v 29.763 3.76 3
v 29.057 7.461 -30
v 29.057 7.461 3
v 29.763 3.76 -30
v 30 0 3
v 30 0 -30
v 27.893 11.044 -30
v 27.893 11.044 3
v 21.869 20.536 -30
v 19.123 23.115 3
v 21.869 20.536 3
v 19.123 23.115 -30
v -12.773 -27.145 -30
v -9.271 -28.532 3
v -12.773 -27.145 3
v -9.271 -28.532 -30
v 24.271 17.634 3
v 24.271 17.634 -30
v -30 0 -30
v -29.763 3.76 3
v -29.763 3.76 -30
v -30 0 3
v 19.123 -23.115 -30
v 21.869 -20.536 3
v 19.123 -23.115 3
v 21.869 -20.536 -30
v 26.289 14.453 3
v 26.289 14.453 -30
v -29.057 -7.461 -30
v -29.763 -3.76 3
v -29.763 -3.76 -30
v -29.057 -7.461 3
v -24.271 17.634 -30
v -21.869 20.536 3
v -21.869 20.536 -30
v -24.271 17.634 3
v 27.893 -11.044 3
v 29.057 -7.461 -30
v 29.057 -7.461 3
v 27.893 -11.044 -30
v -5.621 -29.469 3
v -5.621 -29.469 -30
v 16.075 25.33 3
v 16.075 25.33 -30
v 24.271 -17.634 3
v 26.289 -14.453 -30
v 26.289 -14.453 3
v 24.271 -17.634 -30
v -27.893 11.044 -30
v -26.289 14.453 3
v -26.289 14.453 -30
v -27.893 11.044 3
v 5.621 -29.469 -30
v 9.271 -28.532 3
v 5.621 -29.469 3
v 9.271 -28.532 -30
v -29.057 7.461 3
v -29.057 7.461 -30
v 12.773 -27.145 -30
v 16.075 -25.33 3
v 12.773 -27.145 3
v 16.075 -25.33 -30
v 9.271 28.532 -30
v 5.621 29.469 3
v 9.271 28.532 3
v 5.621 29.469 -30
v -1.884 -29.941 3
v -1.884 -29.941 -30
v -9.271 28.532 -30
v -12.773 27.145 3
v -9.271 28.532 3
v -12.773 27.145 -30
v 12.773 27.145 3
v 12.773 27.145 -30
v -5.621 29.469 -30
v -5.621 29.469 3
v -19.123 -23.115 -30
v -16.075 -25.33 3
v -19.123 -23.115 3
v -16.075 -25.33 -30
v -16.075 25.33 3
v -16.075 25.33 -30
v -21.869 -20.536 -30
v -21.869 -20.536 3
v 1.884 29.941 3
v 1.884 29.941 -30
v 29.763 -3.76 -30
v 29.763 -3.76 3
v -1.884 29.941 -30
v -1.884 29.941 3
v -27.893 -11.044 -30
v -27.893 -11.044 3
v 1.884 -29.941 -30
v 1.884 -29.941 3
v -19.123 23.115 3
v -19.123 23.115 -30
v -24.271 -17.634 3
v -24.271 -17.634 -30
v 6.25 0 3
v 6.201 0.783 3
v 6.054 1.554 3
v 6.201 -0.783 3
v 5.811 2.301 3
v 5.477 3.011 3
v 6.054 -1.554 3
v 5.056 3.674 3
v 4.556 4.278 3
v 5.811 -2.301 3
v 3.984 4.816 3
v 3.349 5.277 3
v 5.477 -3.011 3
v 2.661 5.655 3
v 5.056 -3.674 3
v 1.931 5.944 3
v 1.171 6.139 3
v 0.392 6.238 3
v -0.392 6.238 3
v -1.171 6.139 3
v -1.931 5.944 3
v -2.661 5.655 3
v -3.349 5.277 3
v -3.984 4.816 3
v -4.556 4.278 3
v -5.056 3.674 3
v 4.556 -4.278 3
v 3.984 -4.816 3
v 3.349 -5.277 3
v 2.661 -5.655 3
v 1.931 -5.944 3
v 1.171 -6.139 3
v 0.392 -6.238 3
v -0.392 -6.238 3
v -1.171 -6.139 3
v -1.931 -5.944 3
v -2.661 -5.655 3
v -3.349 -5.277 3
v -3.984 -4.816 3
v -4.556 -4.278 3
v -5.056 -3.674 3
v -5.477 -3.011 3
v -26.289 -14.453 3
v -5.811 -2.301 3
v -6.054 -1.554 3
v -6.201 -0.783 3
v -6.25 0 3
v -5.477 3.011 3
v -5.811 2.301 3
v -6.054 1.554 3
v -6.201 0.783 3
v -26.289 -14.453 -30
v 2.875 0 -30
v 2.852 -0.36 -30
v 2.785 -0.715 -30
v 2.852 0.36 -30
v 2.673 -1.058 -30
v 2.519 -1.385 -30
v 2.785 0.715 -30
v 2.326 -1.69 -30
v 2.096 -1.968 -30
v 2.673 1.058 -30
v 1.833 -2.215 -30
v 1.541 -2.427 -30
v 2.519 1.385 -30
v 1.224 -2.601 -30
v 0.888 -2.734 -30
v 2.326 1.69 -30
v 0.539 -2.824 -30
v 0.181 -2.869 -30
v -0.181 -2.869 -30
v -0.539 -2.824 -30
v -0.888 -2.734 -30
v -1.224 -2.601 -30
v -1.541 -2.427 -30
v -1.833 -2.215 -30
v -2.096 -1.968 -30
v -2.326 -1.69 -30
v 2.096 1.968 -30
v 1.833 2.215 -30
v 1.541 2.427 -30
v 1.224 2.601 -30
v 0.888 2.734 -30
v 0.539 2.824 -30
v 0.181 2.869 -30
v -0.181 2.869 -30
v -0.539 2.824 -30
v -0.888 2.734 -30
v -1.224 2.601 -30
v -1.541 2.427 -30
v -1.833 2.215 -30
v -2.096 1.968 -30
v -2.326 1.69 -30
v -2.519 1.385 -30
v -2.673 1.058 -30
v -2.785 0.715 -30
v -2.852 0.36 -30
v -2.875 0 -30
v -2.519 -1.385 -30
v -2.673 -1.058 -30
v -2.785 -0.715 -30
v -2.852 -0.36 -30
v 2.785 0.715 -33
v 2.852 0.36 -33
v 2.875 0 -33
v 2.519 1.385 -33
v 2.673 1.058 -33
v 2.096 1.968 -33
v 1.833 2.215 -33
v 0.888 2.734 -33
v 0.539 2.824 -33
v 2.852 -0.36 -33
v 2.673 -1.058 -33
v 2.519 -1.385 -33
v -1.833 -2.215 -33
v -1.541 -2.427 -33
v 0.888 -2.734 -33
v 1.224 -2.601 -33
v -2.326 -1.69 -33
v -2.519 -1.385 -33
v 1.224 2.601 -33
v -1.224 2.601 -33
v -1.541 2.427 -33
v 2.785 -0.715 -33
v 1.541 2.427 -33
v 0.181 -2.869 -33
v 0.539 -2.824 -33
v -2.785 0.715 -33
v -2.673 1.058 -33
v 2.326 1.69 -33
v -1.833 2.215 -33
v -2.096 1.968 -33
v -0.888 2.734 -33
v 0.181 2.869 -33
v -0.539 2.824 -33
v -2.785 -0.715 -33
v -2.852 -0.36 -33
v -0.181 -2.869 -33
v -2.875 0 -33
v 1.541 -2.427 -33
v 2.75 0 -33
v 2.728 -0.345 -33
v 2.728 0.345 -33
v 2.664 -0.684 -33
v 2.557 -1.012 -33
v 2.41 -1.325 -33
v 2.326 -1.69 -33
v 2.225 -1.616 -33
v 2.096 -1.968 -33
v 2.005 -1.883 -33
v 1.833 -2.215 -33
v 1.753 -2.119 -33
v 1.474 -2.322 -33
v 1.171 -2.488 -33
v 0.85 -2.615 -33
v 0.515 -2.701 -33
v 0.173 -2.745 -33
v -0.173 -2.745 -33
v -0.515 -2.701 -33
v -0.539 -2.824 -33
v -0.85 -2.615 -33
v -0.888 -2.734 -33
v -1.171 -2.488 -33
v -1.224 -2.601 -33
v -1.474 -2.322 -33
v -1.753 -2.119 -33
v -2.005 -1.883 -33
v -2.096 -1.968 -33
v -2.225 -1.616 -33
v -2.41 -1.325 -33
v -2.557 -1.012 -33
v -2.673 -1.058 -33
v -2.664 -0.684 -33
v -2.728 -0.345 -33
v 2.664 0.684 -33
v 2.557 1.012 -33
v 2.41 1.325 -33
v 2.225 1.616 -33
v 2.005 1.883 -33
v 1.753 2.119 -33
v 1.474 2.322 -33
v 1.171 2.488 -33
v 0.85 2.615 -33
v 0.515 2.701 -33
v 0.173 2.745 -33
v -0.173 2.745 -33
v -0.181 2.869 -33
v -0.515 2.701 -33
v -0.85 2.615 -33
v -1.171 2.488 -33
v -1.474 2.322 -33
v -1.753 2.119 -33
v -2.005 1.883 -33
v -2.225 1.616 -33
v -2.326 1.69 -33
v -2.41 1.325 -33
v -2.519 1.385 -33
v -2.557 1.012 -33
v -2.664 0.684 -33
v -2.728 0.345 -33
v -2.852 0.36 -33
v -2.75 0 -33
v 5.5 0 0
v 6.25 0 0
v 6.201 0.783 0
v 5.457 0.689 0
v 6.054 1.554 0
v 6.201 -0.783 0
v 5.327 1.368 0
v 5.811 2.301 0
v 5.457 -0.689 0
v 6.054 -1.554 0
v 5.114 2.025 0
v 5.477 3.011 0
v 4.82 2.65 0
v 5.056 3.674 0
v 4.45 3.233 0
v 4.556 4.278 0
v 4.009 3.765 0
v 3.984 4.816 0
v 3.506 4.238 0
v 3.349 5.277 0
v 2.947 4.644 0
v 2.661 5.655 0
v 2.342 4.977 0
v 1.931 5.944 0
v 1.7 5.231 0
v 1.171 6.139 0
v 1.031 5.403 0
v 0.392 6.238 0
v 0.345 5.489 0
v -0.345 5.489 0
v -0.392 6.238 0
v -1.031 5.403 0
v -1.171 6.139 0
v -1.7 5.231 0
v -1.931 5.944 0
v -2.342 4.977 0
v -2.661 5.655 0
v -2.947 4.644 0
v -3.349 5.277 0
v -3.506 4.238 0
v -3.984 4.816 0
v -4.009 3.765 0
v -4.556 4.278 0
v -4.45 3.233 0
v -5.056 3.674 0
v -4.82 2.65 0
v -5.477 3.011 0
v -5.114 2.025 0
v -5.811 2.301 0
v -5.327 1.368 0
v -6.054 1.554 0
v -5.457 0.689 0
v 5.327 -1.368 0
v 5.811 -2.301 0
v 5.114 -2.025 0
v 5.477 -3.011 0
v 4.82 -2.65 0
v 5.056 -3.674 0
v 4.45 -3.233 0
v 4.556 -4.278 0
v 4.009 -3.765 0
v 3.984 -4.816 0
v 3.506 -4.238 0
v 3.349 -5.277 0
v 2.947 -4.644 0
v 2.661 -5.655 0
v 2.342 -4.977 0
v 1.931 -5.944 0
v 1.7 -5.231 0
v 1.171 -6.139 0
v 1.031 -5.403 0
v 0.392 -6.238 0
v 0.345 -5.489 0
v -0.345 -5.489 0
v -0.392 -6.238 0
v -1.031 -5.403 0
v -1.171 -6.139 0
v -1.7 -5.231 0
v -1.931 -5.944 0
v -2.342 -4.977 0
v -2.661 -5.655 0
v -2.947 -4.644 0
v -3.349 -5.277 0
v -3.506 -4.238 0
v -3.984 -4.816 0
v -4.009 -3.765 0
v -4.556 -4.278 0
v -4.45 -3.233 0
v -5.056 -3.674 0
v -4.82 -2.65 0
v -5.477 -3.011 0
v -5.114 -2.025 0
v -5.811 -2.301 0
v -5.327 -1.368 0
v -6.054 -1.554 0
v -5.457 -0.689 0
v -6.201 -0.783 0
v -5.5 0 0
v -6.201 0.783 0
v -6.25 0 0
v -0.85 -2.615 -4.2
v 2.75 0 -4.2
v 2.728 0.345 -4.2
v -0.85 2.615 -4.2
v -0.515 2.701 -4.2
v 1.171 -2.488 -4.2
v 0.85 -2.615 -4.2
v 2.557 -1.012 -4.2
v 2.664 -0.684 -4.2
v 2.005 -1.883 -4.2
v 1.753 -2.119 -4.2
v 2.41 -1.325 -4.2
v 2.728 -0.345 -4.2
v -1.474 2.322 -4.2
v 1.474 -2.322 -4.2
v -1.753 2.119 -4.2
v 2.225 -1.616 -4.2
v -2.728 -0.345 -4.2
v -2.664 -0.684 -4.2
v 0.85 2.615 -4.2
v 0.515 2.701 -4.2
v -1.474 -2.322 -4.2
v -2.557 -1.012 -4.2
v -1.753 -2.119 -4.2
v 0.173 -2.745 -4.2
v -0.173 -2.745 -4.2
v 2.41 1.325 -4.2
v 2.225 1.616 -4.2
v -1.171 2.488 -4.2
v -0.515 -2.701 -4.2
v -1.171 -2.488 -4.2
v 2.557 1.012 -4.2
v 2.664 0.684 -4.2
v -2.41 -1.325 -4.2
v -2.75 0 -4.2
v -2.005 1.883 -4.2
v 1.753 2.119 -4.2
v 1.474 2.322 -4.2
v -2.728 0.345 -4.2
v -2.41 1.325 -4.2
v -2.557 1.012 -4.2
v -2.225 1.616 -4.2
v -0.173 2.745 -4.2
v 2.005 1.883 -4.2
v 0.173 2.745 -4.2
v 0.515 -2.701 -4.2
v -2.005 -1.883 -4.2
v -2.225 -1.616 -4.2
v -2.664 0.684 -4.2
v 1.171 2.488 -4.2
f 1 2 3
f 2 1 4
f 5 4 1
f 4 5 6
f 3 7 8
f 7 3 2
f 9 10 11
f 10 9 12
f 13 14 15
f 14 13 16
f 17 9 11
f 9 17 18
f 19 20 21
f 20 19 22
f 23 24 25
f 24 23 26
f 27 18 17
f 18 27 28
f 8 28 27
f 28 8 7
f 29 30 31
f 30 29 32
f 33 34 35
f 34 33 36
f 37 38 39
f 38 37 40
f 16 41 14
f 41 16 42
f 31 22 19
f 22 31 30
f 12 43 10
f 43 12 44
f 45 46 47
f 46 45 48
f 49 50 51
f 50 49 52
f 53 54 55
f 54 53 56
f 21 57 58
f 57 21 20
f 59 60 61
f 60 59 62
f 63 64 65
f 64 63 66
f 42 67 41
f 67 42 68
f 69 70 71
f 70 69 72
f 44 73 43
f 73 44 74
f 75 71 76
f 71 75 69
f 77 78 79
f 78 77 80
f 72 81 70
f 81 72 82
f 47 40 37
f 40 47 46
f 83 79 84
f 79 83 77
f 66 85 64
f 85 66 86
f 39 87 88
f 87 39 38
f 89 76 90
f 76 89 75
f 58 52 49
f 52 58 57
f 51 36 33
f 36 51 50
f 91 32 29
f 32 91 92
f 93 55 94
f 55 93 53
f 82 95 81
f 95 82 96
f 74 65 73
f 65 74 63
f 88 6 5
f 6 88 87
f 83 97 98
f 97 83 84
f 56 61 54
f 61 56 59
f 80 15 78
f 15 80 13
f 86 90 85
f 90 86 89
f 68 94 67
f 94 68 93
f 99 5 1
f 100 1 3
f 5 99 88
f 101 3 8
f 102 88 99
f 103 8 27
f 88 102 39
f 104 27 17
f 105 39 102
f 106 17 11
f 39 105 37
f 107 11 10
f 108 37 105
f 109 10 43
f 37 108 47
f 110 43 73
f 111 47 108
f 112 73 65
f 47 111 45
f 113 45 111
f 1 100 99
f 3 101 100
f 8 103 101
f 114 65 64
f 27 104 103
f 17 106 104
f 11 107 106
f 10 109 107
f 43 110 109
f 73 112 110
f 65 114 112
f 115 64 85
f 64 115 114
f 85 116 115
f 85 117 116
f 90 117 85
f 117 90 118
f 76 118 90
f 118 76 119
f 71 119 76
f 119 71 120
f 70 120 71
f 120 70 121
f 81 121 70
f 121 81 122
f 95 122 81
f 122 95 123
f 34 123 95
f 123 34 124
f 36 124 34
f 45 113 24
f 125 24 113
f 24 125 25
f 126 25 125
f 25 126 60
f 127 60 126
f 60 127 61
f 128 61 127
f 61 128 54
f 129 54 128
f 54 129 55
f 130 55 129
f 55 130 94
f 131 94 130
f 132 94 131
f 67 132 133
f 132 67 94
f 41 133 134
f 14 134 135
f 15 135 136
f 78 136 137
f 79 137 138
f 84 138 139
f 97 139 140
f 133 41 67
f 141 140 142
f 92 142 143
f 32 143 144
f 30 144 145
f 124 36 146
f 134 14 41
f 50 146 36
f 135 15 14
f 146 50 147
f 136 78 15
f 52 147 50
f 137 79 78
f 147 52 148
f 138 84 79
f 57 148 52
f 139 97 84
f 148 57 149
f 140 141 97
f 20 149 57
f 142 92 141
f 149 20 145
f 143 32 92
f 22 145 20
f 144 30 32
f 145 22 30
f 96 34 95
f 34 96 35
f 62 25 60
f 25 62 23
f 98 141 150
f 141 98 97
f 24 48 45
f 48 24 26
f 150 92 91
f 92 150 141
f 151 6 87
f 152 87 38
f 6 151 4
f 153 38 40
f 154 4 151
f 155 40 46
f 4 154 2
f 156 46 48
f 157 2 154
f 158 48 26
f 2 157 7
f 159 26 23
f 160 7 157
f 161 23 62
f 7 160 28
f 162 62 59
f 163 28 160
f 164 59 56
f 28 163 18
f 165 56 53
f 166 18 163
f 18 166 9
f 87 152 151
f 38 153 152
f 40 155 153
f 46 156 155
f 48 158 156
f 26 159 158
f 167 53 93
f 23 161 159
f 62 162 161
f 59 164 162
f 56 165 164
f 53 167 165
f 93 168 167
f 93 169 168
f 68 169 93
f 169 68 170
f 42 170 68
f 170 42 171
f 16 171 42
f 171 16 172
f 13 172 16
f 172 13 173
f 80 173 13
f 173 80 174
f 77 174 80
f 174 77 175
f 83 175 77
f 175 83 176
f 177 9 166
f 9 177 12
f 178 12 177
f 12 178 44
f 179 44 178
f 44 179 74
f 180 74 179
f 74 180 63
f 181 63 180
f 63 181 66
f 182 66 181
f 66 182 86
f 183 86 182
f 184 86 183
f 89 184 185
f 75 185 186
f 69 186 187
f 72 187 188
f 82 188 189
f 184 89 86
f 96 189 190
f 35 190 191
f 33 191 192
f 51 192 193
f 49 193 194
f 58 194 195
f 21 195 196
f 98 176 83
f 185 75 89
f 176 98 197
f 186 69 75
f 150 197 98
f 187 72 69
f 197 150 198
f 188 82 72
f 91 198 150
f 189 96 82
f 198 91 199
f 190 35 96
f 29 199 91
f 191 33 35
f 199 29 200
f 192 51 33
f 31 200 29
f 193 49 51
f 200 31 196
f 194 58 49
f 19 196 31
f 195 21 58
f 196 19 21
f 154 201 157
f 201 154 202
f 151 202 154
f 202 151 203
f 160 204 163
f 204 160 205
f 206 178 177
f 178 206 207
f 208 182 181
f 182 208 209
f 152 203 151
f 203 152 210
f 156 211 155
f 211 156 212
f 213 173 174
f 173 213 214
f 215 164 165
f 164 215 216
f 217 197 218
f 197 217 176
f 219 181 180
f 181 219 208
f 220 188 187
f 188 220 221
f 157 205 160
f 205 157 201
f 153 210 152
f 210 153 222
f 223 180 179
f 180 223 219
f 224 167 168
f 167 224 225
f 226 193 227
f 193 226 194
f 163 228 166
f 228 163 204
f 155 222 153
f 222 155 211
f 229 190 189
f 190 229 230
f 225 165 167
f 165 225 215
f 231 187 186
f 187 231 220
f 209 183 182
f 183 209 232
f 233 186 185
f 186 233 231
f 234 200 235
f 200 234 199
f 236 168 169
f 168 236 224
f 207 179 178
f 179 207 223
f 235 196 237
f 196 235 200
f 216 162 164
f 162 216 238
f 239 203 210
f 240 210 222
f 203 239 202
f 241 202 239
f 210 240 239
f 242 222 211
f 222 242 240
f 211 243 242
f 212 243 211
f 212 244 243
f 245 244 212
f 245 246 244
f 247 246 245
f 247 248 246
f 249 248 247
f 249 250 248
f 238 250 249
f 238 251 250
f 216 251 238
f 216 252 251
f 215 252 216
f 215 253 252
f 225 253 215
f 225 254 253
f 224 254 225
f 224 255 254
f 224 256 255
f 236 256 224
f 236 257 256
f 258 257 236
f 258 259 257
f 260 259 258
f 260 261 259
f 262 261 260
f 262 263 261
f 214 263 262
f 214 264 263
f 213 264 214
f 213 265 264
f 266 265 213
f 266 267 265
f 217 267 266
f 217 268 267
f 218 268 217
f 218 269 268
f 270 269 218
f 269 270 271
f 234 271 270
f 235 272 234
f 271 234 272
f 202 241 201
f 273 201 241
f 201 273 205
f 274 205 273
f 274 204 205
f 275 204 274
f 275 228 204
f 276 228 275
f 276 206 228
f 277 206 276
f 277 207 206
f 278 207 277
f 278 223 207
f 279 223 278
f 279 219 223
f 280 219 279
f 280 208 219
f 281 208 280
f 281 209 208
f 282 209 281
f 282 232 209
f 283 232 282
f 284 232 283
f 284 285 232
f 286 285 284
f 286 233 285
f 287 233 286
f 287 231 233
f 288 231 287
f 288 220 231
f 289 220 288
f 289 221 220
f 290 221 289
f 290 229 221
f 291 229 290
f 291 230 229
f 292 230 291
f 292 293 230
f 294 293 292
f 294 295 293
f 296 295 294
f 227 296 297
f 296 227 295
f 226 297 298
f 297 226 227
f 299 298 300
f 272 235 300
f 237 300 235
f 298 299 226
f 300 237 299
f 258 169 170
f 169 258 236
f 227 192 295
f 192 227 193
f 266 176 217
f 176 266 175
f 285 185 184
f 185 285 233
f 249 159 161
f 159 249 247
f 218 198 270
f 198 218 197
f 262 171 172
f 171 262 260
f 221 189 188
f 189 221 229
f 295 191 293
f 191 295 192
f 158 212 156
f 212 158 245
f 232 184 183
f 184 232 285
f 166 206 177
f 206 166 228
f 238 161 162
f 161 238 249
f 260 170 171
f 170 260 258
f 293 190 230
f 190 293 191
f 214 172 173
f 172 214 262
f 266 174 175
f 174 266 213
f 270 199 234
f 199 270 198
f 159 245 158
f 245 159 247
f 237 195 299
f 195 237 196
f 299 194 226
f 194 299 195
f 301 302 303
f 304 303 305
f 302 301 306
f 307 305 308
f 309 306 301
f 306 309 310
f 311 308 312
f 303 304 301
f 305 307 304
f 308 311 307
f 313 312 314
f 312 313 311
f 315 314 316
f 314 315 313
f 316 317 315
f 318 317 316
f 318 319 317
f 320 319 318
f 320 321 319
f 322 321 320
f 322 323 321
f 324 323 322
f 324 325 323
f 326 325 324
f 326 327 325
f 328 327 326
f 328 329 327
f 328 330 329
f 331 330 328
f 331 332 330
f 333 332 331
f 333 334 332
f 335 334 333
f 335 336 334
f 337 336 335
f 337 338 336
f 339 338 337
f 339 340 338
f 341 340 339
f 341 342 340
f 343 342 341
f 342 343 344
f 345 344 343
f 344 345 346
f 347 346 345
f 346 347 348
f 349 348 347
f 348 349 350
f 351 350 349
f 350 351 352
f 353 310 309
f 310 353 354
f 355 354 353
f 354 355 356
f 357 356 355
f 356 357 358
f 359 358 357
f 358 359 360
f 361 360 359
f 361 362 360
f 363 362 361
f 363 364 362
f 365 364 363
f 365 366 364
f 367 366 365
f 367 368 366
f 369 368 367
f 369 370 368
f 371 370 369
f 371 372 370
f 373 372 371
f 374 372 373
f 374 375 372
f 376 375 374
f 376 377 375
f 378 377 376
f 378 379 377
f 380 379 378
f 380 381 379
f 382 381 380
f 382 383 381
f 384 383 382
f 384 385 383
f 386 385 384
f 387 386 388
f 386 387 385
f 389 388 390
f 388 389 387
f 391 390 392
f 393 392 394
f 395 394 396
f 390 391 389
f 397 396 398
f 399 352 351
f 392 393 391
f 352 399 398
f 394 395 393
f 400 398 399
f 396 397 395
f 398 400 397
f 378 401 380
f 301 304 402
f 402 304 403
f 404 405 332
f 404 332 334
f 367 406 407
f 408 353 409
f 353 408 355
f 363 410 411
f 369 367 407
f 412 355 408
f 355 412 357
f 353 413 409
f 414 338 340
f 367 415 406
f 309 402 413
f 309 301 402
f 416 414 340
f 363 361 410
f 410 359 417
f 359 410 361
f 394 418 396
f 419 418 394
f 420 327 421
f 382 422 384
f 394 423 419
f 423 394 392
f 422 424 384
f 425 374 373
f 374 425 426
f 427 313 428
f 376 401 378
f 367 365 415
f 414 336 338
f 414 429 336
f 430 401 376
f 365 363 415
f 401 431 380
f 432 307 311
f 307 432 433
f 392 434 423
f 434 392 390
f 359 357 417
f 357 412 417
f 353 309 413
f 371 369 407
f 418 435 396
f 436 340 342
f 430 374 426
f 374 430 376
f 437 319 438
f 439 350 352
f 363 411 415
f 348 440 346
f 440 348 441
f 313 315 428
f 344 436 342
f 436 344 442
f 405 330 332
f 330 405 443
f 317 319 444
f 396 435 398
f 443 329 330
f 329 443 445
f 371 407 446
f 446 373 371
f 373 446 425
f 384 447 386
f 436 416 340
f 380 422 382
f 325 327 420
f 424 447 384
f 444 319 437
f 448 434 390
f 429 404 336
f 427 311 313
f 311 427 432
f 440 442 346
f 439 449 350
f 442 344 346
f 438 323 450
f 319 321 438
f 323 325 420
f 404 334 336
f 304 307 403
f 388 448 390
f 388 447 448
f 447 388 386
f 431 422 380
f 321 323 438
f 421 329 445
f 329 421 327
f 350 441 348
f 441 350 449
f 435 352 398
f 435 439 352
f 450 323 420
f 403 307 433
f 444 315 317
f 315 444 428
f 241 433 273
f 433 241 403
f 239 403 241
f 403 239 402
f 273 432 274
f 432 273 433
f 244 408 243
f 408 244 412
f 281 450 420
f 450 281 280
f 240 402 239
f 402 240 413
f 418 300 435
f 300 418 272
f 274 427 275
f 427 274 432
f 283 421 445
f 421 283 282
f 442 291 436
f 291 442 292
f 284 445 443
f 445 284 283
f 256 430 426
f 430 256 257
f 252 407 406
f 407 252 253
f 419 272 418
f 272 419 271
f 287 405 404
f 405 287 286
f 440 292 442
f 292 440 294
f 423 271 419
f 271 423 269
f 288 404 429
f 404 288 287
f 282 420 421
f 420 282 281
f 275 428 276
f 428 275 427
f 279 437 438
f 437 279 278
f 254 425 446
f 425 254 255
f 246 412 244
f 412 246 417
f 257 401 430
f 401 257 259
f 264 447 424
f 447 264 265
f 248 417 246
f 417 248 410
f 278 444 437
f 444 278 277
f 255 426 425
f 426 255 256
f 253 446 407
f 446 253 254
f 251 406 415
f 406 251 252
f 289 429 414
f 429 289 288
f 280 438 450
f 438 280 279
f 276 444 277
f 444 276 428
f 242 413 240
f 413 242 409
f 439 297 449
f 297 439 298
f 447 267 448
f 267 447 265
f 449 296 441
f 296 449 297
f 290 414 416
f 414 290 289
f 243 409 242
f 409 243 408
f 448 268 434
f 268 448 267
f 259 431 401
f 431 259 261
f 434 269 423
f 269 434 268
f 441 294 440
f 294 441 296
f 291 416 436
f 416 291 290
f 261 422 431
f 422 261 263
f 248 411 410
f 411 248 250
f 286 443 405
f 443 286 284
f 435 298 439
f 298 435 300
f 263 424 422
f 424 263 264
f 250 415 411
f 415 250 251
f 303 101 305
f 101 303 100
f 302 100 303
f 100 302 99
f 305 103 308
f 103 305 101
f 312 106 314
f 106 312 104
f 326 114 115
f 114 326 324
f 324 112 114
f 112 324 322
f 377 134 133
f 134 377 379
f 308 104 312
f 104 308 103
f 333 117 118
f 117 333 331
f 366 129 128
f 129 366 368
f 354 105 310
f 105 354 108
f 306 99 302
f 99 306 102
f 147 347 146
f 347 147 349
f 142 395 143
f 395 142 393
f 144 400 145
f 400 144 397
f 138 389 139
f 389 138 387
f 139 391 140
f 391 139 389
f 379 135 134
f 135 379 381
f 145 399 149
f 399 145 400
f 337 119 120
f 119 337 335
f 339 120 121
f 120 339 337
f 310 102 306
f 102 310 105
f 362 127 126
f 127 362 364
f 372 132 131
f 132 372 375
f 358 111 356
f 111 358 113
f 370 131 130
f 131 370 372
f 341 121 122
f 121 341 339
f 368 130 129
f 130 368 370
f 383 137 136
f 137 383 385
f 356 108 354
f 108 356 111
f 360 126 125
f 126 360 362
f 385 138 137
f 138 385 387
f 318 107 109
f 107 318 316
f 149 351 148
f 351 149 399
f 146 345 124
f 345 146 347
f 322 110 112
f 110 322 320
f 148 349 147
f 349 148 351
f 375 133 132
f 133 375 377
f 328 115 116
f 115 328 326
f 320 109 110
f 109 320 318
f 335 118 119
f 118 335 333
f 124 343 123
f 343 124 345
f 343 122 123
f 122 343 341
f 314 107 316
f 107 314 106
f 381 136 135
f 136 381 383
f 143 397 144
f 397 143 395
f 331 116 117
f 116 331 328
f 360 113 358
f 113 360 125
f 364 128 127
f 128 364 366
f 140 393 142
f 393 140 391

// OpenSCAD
$fn = 50;

difference() {
	union() {
		translate(v = [0, 0, -30.0]) {
			cylinder(h = 33, r = 30.0);
		}
		#translate(v = [0, 0, -33.0]) {
			cylinder(h = 33, r = 2.875);
		}
	}
	union() {
		translate(v = [0, 0, 0]) {
			rotate(a = [0, 0, 0]) {
				difference() {
					union() {
						translate(v = [0, 0, -33.0]) {
							cylinder(h = 33, r = 2.25);
						}
						translate(v = [0, 0, -4.2]) {
							cylinder(h = 4.2, r1 = 2.75, r2 = 5.5);
						}
						translate(v = [0, 0, -33.0]) {
							cylinder(h = 33, r = 2.75);
						}
						translate(v = [0, 0, -33.0]) {
							cylinder(h = 33, r = 2.25);
						}
					}
					union();
				}
			}
		}
		#cylinder(h = 3, r = 6.25);
	}
}
